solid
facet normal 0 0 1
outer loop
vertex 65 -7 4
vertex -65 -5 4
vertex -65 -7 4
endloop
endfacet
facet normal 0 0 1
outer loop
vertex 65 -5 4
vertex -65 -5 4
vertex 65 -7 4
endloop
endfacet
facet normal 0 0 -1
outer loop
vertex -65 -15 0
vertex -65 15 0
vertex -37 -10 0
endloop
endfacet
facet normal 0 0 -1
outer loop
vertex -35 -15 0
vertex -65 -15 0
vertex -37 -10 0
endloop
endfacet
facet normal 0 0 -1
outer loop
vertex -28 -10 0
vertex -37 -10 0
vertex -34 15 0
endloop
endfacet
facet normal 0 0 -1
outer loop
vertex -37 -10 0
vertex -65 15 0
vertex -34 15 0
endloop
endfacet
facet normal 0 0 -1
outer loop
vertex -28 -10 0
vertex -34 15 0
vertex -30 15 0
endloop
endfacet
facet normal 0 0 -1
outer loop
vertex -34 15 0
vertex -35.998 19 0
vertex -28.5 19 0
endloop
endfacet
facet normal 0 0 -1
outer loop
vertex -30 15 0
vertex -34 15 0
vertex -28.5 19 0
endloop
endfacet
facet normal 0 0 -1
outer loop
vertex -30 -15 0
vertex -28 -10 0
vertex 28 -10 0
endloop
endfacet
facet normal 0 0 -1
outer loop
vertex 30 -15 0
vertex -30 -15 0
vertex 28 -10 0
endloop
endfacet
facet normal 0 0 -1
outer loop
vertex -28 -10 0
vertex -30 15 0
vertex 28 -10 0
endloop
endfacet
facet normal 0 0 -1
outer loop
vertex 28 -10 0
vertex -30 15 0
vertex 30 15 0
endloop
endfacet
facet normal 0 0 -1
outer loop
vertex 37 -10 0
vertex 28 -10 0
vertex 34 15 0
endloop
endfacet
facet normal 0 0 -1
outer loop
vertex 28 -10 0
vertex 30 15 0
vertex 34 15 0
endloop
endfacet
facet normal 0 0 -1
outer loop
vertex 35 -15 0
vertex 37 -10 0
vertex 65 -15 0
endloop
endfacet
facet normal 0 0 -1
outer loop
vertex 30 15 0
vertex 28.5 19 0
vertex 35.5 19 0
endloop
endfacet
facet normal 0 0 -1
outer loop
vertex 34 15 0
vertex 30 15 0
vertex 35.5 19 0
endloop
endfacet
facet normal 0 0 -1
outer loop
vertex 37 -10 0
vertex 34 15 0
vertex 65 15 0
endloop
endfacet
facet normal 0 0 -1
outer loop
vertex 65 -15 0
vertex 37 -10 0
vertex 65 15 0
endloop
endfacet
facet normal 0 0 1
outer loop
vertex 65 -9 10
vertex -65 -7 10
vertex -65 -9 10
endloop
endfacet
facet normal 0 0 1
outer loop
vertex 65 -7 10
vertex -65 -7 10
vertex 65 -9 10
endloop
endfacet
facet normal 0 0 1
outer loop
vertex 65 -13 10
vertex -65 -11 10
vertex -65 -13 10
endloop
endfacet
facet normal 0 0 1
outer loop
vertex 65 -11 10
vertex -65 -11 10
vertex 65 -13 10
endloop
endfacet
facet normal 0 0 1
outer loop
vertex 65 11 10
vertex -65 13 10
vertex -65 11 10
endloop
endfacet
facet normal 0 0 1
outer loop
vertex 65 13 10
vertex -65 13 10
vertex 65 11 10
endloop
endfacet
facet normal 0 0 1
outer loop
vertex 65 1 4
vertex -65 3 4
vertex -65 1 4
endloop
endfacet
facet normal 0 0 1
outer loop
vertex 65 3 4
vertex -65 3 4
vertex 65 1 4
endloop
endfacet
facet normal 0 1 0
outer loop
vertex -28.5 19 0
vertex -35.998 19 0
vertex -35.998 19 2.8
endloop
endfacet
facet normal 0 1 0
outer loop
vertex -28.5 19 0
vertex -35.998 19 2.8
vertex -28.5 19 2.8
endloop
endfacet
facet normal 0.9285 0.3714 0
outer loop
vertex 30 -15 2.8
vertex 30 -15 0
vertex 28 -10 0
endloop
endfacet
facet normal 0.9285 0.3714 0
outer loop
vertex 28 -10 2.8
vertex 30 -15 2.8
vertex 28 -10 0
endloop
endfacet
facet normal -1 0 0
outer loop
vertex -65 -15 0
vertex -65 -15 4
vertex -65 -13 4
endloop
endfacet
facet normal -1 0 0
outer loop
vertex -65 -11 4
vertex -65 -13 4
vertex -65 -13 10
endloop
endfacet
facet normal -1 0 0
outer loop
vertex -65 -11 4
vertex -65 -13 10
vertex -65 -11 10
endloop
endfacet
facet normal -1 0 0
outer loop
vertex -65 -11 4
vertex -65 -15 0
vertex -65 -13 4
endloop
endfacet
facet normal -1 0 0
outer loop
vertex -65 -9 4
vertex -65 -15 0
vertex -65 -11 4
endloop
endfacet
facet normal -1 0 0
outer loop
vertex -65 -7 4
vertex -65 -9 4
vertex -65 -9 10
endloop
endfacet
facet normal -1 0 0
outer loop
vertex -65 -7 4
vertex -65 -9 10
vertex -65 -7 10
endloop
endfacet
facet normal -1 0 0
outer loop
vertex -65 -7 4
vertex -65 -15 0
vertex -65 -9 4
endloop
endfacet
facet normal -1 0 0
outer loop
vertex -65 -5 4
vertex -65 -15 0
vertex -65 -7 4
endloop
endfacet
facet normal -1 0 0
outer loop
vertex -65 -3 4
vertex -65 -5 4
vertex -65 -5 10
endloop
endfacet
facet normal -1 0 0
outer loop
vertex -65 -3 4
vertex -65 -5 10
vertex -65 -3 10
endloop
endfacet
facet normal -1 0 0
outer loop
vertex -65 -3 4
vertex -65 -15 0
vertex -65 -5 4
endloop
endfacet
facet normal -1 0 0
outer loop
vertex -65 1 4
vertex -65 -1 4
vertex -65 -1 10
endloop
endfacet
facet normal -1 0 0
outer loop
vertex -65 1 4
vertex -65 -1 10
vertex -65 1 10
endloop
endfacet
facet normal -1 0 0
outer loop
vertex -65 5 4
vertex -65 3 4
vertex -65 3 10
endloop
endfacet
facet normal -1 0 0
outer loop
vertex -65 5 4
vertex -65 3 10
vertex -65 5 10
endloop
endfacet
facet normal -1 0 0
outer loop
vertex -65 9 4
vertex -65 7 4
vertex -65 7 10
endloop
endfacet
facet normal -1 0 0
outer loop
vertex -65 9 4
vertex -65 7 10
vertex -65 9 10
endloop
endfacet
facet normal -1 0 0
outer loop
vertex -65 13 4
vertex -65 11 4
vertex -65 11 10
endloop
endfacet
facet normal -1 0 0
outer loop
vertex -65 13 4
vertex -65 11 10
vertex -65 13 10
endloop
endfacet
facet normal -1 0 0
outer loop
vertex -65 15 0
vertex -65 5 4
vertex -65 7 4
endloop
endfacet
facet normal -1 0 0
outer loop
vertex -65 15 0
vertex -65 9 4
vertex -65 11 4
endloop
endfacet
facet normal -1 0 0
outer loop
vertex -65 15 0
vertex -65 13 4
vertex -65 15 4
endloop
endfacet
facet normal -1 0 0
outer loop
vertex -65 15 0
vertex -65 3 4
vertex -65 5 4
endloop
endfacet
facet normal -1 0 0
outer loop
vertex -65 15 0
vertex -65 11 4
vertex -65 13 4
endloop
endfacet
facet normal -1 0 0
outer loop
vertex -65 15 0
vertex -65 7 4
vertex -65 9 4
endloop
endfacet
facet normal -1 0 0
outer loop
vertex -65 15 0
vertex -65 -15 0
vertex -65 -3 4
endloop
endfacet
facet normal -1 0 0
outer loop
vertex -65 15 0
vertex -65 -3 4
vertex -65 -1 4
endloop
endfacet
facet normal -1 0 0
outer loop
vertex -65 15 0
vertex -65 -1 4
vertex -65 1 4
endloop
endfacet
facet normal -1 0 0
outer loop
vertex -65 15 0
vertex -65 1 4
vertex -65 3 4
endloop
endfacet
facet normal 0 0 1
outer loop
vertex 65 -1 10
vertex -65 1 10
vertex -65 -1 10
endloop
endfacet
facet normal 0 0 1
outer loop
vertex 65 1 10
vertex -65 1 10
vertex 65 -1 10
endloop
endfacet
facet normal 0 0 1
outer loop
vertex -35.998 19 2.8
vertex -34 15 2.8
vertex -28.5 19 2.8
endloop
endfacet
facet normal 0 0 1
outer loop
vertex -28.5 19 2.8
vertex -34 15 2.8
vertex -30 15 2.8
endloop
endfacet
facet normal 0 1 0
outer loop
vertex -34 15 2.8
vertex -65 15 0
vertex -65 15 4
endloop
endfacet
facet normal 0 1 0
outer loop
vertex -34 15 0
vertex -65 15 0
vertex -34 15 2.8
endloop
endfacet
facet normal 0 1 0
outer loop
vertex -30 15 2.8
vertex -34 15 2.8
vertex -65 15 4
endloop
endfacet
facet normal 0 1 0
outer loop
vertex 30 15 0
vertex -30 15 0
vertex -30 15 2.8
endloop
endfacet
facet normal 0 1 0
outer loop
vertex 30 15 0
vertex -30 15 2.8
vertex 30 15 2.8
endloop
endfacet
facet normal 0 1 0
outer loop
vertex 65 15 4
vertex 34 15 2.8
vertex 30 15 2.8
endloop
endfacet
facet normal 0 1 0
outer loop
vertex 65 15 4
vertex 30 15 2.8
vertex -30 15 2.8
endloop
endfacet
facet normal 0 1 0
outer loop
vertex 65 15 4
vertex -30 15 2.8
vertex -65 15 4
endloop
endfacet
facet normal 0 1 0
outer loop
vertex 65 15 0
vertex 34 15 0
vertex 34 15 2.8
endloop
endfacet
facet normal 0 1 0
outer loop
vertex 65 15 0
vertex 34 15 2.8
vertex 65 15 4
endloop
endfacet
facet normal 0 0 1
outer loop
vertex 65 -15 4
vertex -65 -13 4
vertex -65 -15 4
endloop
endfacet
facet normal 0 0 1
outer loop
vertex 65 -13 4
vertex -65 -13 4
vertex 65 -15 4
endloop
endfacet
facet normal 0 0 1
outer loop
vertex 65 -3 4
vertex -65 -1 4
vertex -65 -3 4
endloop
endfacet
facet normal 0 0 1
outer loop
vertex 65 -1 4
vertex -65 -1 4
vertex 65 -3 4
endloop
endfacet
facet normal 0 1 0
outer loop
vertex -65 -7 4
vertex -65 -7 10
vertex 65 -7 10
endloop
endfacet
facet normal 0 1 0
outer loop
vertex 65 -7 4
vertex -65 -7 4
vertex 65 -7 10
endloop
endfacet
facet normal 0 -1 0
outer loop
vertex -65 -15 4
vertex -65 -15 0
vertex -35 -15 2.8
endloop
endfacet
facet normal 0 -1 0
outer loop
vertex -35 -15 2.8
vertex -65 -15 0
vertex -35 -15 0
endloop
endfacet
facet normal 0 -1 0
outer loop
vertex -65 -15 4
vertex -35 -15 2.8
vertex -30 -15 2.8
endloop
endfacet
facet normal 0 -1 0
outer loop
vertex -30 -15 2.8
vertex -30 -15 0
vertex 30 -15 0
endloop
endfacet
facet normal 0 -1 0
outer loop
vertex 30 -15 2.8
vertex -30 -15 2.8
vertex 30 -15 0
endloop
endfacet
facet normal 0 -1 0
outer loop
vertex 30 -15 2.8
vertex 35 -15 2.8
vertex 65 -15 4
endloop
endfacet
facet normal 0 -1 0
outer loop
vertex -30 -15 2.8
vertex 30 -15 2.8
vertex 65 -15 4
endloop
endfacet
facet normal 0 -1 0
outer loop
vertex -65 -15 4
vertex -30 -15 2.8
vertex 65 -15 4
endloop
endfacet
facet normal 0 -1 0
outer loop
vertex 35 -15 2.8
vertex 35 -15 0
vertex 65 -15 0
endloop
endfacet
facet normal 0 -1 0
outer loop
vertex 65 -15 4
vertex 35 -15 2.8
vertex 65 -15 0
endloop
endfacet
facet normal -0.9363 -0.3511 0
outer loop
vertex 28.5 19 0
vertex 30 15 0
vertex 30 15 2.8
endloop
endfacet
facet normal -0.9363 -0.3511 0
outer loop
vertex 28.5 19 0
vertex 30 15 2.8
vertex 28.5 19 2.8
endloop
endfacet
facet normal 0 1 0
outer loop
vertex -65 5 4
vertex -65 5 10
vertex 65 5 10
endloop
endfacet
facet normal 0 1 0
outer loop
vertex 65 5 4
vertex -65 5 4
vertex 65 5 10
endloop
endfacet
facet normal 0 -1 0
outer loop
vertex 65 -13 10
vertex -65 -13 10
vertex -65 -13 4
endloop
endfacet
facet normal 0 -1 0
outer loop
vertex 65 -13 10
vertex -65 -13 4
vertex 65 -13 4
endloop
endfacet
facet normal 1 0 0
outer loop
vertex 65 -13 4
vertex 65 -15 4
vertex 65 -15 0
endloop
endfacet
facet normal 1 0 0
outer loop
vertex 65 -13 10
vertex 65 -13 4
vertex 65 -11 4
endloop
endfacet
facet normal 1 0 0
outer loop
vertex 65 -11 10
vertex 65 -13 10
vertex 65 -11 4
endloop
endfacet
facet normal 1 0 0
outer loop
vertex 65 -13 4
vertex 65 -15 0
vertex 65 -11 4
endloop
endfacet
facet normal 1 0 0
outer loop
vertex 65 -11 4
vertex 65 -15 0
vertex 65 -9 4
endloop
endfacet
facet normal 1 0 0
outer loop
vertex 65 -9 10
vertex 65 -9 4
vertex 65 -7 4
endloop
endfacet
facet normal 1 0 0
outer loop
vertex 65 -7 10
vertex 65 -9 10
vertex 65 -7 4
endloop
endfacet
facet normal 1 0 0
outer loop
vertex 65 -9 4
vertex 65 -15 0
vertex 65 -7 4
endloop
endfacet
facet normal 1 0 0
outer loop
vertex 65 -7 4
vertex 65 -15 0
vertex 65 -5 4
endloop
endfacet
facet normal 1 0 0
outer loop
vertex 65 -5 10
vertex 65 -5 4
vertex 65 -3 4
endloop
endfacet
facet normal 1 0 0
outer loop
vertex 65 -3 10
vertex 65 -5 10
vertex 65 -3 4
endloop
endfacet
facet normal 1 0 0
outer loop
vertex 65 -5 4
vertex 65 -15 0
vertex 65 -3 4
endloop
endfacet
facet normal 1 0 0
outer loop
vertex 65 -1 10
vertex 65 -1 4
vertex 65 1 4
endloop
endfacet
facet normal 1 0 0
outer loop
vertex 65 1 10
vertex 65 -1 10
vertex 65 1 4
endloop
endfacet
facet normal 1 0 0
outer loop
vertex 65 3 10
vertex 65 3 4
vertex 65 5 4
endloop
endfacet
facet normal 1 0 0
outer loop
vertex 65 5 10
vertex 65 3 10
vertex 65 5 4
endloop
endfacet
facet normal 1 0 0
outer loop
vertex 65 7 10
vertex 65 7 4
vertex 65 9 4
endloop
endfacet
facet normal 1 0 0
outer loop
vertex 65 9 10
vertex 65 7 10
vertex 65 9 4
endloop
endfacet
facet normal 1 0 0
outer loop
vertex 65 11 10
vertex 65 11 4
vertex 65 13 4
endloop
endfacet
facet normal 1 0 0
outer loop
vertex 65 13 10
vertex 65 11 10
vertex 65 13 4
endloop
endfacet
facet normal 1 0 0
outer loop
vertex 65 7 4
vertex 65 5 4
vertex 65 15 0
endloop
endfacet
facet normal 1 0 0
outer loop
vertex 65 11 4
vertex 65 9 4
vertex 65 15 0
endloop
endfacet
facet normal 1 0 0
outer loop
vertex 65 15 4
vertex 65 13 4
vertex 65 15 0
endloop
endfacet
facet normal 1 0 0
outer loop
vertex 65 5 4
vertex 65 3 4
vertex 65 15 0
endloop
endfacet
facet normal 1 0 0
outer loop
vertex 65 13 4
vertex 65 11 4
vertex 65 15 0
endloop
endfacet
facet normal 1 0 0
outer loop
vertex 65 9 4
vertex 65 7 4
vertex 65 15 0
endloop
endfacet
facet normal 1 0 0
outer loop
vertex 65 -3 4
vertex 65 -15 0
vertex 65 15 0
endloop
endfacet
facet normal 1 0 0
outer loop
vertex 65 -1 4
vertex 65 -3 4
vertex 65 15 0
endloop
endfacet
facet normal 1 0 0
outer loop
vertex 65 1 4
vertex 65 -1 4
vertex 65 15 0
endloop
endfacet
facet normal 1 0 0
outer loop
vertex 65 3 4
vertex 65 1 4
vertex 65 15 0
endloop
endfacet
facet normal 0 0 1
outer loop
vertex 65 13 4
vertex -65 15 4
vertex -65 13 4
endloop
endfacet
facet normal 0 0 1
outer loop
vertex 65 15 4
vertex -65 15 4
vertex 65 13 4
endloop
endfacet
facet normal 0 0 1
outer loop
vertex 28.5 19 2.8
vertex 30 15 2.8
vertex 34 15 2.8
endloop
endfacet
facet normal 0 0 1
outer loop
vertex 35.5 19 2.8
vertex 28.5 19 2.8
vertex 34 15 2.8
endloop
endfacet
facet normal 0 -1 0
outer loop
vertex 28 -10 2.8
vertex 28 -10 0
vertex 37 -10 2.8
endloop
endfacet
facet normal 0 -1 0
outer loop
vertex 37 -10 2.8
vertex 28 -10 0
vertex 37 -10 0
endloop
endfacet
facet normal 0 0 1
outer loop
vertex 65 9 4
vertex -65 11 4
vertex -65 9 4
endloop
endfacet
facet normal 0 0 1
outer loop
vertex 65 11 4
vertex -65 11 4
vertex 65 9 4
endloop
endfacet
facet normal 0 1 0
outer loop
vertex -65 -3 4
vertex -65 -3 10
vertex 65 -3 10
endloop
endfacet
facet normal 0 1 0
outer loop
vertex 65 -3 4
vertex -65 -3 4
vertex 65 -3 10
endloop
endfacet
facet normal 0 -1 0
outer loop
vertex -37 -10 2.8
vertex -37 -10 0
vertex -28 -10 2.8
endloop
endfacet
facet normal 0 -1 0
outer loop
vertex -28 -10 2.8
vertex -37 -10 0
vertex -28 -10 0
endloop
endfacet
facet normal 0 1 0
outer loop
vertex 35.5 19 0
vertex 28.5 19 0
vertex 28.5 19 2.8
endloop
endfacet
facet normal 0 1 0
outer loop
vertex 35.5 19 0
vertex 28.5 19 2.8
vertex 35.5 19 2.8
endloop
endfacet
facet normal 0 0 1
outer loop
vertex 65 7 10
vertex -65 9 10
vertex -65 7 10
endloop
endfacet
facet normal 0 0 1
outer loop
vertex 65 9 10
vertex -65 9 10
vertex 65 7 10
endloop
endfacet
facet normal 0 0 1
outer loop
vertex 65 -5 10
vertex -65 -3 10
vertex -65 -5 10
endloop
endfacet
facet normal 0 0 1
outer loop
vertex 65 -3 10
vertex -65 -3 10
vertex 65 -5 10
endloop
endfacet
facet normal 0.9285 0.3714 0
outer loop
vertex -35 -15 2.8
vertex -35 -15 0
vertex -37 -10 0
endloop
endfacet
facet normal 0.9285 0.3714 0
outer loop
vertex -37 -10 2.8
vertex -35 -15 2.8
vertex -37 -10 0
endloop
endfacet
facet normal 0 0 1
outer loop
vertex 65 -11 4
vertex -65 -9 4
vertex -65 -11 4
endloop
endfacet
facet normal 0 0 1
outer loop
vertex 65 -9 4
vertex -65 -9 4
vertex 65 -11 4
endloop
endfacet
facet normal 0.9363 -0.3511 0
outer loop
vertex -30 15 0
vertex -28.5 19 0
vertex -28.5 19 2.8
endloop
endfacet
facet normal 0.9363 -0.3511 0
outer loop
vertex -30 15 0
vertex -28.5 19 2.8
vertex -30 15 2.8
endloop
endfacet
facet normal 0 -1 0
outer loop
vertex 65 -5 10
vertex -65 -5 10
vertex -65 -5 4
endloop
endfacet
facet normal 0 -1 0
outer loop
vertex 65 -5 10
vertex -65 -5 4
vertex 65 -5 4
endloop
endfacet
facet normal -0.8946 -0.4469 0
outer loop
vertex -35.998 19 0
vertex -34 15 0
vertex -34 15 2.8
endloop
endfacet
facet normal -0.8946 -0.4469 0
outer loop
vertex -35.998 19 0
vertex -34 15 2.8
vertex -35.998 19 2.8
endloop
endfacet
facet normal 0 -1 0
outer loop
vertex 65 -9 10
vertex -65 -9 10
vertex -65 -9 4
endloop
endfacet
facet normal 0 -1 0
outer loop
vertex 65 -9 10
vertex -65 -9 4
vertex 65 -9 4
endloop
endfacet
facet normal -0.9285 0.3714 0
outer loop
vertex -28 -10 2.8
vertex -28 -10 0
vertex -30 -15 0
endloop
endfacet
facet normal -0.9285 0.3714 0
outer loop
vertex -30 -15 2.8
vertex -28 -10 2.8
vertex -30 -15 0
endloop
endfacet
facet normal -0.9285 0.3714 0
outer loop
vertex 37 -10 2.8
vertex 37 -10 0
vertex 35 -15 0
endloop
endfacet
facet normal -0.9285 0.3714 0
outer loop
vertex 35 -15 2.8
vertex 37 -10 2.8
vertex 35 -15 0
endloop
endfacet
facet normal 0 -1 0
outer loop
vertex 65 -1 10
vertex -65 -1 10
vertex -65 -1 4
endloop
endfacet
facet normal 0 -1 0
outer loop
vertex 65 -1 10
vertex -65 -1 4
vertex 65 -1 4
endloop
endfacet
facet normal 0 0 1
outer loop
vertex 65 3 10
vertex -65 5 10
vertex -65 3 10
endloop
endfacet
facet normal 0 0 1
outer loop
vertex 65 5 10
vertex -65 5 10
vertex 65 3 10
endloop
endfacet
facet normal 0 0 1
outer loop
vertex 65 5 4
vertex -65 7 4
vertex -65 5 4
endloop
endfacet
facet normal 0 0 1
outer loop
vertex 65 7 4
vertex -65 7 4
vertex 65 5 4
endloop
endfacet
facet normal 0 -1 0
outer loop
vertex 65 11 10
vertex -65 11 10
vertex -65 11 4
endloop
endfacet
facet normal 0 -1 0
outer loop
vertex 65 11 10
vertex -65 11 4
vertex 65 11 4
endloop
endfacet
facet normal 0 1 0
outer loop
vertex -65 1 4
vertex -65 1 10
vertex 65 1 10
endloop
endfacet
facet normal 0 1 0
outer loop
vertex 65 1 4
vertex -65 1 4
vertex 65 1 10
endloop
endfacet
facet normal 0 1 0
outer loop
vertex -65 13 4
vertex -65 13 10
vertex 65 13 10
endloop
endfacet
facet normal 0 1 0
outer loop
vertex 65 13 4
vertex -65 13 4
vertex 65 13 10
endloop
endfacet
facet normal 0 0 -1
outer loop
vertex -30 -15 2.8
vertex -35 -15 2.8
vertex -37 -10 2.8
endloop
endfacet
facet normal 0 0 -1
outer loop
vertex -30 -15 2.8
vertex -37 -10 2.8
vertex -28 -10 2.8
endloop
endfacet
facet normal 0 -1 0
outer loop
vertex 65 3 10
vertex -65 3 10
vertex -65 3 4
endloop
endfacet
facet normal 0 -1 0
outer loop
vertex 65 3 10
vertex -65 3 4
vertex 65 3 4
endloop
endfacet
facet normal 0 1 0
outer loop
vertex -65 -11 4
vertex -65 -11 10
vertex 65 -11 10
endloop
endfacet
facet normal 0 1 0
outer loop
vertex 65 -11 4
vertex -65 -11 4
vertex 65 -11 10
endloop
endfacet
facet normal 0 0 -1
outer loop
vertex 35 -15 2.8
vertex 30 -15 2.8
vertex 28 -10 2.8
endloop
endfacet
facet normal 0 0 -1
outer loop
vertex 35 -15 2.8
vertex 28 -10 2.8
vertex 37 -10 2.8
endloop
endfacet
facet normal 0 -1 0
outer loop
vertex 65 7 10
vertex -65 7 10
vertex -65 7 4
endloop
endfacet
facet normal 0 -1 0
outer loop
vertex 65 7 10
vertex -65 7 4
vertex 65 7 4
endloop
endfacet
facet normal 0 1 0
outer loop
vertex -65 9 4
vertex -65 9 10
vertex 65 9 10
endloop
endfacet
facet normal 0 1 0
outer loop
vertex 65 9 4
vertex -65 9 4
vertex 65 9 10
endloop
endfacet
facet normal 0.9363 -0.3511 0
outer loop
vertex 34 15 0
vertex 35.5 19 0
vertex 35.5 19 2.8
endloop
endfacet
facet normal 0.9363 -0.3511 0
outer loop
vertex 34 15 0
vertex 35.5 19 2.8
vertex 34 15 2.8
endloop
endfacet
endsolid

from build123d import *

# Parameters (mm, degrees)
F0_W     = 130
F0_H     = 30
F1_DEPTH = 10
F2_W     = 130
F2_H     = 2
F3_DEPTH = 6
F4_W     = 5
F4_H     = 5
F5_DEPTH = 2.8
F4_W_2   = 4
F4_H_2   = 4
F6_DEPTH = 2.8


with BuildPart() as f1:
    # F0 (on Top) → F1 (new body)
    with BuildSketch(Plane.XY):
        Rectangle(F0_W, F0_H)
    extrude(amount=F1_DEPTH)

    # F2 (on face) → F3 (cut)
    with BuildSketch(Plane.XY.offset(10)):
        with Locations((0, -14)):
            Rectangle(F2_W, F2_H)
        with Locations((0, -10)):
            Rectangle(F2_W, F2_H)
        with Locations((0, -6)):
            Rectangle(F2_W, F2_H)
        with Locations((0, -2)):
            Rectangle(F2_W, F2_H)
        with Locations((0, 2)):
            Rectangle(F2_W, F2_H)
        with Locations((0, 6)):
            Rectangle(F2_W, F2_H)
        with Locations((0, 10)):
            Rectangle(F2_W, F2_H)
        with Locations((0, 14)):
            Rectangle(F2_W, F2_H)
    extrude(amount=-F3_DEPTH, mode=Mode.SUBTRACT)

    # F4 (on face) → F5 (cut)
    with BuildSketch(Plane(origin=(0, 0, 0), x_dir=(1, 0, 0), z_dir=(0, 0, -1))):
        with Locations((-32.5, 12.5)):
            Rectangle(F4_W, F4_H)
        Polygon((-28, 10), (-30, 15), (-30, 10), align=None)
        Polygon((-35, 10), (-35, 15), (-37, 10), align=None)
        with Locations((32.5, 12.5)):
            Rectangle(F4_W, F4_H)
        Polygon((30, 10), (30, 15), (28, 10), align=None)
        Polygon((37, 10), (35, 15), (35, 10), align=None)
    extrude(amount=-F5_DEPTH, mode=Mode.SUBTRACT)

    # F4 (on face) → F6 (join)
    with BuildSketch(Plane(origin=(0, 0, 0), x_dir=(1, 0, 0), z_dir=(0, 0, -1))):
        with Locations((32, -17)):
            Rectangle(F4_W_2, F4_H_2)
        Polygon((35.5, -19), (34, -15), (34, -19), align=None)
        Polygon((30, -19), (30, -15), (28.5, -19), align=None)
        with Locations((-32, -17)):
            Rectangle(F4_W_2, F4_H_2)
        Polygon((-28.5, -19), (-30, -15), (-30, -19), align=None)
        Polygon((-34, -19), (-34, -15), (-35.9975211322, -19), align=None)
    extrude(amount=-F6_DEPTH)


solid = f1.part
